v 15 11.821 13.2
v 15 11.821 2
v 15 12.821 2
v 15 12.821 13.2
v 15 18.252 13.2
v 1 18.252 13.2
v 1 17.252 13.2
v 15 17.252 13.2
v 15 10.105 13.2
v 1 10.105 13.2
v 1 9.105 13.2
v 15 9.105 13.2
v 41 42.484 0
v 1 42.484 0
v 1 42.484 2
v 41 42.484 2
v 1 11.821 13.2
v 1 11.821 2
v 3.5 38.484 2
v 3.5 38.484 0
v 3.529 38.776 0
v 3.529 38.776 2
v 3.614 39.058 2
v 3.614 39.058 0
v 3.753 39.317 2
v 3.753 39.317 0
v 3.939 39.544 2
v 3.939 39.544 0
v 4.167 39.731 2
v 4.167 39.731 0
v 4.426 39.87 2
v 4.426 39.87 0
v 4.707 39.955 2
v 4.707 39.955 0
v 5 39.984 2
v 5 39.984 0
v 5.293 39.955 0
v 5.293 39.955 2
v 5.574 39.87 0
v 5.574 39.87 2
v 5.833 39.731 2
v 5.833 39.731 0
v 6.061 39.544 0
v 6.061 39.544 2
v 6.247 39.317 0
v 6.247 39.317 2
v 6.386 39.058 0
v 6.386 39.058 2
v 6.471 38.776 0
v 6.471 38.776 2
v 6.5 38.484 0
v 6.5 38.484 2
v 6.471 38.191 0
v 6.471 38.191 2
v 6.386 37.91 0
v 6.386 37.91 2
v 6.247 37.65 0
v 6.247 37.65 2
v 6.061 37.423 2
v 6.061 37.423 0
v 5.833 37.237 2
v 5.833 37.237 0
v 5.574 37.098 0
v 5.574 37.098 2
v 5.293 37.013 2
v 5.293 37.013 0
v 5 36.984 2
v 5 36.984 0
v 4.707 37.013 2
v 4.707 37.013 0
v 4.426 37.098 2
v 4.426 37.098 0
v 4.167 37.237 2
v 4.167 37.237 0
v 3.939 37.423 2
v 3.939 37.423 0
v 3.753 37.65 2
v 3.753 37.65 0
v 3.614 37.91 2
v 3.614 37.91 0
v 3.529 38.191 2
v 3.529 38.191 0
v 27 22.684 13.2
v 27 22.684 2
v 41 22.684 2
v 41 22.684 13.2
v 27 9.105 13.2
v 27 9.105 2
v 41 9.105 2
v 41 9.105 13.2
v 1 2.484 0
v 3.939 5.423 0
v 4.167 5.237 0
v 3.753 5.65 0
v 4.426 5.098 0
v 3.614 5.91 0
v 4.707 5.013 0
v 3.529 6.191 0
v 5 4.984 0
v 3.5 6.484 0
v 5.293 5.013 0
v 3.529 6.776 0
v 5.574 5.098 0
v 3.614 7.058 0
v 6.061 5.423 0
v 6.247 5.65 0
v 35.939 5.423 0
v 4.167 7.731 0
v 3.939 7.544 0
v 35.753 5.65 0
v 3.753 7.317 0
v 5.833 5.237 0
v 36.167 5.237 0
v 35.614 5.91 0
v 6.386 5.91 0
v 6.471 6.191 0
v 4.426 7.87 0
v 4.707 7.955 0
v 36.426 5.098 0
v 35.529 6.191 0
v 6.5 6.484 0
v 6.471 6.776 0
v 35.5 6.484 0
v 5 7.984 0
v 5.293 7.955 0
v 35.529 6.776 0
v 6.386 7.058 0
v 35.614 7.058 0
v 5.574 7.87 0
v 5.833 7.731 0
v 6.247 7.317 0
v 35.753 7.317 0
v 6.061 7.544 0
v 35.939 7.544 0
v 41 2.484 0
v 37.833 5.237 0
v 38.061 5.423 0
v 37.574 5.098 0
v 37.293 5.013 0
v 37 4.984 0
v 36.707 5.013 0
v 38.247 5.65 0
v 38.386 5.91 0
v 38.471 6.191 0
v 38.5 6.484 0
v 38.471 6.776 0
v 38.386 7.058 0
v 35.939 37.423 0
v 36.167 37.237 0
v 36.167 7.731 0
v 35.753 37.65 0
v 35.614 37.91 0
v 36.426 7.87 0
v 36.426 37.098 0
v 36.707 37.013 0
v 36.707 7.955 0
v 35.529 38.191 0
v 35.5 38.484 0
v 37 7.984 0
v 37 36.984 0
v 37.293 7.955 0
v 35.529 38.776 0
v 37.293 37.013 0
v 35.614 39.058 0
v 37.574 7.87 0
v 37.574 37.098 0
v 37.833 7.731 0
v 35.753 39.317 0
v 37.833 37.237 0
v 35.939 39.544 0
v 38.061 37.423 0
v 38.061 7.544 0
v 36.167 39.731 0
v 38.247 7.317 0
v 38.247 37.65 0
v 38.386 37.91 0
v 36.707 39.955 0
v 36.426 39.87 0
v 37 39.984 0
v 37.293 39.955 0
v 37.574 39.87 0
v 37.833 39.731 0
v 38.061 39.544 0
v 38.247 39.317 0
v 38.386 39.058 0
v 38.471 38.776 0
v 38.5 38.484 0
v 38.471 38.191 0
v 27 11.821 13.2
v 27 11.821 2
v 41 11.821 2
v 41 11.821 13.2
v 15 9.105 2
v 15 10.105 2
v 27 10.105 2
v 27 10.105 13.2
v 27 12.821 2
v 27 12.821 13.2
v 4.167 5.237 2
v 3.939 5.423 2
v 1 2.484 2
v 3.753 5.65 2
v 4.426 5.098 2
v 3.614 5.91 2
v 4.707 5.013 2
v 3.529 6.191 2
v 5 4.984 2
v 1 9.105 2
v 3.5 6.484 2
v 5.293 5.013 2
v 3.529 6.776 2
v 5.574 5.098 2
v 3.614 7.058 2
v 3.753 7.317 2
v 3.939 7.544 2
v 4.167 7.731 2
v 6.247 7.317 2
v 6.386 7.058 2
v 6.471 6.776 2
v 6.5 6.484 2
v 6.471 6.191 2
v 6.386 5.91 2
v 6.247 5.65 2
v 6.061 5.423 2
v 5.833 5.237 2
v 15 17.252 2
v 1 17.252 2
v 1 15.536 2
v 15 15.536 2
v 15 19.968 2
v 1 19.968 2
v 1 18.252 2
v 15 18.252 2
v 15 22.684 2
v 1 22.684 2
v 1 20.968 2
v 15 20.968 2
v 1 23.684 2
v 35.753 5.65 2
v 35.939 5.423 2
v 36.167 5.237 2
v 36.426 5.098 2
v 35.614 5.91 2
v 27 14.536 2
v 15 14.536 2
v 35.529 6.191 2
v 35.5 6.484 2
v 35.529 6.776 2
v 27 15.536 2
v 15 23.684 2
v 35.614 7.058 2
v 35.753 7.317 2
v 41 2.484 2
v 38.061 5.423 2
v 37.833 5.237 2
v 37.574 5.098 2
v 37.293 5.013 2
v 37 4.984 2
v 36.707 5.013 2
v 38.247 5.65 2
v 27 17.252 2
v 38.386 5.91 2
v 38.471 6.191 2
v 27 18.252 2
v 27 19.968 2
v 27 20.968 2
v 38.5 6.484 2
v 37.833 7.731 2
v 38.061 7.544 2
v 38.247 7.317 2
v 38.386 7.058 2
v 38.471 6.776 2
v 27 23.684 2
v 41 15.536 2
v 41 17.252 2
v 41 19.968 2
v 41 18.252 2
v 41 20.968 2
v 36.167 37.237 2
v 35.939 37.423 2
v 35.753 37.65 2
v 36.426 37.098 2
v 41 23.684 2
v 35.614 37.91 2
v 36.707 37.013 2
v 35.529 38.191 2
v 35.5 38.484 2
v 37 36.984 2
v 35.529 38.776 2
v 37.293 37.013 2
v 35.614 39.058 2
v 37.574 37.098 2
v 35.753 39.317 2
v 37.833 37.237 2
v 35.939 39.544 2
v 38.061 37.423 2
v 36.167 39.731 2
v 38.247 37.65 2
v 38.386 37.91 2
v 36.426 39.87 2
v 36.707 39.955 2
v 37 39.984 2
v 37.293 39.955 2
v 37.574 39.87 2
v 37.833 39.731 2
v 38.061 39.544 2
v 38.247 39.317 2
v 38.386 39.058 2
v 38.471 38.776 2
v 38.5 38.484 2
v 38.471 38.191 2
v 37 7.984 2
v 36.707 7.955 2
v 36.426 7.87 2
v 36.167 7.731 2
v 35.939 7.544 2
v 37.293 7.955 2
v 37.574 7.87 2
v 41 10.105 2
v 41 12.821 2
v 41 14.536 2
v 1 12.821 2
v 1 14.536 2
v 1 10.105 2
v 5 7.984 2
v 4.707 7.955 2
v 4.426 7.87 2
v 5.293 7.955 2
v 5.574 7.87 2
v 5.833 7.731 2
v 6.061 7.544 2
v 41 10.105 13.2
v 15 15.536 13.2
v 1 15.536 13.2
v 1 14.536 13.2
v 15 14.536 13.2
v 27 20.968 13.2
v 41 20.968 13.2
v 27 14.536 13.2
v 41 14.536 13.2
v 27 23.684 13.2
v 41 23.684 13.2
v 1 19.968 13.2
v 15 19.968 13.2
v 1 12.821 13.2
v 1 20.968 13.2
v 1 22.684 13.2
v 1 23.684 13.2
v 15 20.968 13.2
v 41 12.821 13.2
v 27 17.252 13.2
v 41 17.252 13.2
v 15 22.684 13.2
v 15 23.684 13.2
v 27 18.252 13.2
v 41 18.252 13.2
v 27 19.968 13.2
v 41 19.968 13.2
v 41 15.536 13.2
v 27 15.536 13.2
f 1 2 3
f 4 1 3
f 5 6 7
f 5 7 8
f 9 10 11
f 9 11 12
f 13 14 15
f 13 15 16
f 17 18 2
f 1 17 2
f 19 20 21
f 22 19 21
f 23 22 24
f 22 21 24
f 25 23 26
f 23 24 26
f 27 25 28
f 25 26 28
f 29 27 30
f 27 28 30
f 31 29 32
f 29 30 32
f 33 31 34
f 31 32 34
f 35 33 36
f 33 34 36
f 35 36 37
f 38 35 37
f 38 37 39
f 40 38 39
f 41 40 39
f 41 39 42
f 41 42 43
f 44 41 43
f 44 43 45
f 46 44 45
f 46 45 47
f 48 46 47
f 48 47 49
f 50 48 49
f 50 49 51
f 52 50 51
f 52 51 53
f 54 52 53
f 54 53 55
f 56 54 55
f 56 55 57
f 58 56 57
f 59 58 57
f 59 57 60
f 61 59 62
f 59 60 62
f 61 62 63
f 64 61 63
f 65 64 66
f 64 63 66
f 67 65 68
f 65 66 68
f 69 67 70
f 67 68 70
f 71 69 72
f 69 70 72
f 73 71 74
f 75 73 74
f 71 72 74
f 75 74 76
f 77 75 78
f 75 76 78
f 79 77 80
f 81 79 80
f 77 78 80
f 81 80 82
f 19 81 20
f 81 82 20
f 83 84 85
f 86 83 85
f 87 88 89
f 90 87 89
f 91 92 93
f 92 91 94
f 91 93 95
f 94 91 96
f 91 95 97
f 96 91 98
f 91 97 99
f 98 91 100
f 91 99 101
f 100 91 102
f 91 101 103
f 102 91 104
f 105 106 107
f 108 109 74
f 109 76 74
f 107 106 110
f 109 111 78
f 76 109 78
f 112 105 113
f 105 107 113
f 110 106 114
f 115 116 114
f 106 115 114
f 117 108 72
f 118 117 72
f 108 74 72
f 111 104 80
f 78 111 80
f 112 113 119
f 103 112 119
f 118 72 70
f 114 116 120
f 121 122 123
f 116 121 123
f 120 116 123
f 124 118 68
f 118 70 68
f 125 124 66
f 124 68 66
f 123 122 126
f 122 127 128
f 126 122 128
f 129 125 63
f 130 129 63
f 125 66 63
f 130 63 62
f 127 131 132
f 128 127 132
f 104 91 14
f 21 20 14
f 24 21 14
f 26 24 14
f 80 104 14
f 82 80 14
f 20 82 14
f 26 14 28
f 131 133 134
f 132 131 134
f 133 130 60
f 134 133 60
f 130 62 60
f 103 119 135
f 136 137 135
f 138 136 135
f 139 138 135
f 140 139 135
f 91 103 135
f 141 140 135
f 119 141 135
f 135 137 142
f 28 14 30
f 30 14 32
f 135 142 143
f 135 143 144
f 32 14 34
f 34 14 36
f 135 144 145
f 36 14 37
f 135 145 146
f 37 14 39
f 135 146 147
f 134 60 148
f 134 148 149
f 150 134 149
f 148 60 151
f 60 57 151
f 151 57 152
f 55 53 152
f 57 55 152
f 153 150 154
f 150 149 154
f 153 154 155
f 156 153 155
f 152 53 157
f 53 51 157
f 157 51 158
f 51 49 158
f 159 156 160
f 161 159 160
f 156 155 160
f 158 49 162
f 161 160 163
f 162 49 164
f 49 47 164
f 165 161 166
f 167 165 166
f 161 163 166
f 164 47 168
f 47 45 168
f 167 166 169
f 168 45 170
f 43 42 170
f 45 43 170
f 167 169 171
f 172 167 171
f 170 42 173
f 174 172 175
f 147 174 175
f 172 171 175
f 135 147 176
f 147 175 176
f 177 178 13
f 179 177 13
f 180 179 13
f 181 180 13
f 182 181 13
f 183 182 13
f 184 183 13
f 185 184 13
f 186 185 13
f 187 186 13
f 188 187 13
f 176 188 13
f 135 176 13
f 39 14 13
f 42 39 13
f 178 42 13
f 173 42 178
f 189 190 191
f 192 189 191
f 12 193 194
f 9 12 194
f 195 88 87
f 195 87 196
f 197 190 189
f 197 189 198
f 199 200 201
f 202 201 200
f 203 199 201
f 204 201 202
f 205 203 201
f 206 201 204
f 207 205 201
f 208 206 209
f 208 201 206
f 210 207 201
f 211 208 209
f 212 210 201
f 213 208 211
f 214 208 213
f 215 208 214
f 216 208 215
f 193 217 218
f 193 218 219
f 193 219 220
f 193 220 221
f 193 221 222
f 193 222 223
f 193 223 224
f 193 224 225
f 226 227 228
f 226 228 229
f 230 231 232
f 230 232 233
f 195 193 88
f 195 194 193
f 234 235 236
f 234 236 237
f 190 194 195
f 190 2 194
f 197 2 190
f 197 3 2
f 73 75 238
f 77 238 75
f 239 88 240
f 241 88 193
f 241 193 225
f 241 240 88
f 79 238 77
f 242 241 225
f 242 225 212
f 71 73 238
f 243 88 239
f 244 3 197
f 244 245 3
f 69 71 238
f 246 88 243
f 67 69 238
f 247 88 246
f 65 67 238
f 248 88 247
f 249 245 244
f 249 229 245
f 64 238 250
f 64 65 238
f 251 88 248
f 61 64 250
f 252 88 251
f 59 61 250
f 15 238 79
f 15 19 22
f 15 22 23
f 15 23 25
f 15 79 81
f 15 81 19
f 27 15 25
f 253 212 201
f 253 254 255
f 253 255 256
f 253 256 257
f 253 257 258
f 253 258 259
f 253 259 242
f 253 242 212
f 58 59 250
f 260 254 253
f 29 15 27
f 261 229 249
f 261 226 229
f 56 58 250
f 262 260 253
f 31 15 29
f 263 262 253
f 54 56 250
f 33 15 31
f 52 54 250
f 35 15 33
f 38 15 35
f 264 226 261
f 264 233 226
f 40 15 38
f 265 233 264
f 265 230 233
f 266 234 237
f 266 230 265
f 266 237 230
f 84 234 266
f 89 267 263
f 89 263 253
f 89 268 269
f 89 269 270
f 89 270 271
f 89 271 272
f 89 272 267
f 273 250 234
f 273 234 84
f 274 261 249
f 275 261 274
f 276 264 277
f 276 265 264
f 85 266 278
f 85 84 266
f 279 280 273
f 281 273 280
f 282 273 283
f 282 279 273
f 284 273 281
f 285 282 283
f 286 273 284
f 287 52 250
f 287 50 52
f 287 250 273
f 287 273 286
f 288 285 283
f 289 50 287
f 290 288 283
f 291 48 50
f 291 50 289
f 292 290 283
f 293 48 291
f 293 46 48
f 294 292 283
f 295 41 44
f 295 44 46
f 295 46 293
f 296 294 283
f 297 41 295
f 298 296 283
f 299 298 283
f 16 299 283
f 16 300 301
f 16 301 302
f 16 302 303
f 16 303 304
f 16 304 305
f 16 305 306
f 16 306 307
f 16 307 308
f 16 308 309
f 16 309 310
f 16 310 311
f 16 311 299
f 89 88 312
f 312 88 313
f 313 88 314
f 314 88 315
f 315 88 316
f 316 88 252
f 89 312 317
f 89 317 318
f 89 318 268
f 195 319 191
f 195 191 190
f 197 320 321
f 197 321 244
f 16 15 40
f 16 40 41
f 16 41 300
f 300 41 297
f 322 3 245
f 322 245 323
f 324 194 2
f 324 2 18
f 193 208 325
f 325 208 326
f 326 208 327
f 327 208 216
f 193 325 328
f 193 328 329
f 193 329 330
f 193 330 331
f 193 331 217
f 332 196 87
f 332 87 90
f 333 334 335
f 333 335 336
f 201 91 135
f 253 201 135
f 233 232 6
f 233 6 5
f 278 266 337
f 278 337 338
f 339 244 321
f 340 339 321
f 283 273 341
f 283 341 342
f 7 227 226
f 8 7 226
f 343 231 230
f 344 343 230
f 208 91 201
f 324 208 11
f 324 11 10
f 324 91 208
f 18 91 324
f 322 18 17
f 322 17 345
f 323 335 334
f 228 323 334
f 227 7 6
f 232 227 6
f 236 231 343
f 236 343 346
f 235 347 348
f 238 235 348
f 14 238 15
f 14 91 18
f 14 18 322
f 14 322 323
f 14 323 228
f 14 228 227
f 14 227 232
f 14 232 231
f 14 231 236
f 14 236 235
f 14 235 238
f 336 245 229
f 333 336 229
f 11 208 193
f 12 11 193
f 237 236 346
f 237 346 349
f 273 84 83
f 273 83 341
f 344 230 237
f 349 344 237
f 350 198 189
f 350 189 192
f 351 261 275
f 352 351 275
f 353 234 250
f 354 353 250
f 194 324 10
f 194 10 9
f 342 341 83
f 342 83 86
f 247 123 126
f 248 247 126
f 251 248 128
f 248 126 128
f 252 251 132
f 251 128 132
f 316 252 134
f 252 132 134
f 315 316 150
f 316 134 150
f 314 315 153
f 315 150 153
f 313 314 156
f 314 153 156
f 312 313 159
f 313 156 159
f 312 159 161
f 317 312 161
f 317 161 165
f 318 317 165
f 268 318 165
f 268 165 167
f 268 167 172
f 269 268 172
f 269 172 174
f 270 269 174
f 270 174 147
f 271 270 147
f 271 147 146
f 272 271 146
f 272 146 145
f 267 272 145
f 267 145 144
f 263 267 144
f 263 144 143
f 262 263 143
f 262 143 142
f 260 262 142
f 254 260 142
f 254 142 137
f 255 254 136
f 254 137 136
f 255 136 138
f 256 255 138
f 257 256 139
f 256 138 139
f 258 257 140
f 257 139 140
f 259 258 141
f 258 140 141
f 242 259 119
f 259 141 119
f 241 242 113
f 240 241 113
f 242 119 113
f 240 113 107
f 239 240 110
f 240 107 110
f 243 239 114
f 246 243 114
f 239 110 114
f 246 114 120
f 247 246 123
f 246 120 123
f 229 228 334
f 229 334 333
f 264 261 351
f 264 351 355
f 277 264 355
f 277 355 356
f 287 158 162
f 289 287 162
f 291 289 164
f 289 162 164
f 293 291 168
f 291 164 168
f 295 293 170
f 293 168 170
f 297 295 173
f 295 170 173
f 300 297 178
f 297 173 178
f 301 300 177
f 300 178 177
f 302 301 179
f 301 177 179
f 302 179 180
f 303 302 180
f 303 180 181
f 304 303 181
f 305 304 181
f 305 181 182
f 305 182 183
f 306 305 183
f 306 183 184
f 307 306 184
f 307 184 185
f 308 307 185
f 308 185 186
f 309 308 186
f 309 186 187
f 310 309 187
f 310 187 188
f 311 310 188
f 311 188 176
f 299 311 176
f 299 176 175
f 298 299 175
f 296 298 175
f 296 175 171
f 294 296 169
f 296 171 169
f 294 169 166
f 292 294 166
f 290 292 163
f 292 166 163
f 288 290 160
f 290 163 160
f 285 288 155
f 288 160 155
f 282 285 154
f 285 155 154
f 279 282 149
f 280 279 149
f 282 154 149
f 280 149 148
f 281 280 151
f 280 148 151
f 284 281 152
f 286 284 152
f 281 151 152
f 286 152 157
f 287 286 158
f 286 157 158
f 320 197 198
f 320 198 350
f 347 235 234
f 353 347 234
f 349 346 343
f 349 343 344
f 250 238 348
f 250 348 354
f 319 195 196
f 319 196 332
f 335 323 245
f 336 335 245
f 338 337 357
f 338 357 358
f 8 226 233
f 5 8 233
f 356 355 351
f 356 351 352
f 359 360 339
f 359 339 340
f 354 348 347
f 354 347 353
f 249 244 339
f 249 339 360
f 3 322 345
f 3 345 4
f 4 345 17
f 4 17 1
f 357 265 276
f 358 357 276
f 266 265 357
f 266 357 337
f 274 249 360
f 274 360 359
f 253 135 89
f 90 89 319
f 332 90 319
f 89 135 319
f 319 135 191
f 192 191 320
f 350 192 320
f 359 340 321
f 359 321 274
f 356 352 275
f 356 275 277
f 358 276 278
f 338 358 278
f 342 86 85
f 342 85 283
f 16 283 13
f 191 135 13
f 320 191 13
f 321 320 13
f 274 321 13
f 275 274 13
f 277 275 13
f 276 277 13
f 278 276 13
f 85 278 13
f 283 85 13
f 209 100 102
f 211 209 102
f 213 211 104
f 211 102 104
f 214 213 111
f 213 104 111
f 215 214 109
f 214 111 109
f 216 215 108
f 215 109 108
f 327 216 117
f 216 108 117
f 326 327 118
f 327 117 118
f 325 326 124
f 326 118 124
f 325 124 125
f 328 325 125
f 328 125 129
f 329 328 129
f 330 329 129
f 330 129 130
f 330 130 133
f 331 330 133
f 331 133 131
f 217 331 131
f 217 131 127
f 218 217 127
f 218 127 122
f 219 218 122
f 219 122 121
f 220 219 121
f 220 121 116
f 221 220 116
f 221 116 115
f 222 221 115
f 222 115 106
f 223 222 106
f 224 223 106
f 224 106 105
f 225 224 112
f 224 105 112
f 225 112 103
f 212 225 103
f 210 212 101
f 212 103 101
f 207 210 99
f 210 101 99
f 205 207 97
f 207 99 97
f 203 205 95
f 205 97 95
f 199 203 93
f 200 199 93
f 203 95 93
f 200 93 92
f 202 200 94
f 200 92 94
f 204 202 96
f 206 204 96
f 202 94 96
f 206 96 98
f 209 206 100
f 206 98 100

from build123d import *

# Parameters (mm, degrees)
SKETCH1_W            = 40
SKETCH1_H            = 40
BOSS_EXTRUDE1_DEPTH  = 2
EXTRUDE_THIN1_START  = 2
SKETCH1_3_W          = 14
SKETCH1_3_H          = 1
EXTRUDE_THIN1_DEPTH  = 11.2
SKETCH3_R            = 1.5
CUT_EXTRUDE1_DEPTH   = 13.2
LPATTERN1_COUNT      = 2
LPATTERN1_PITCH      = 32
LPATTERN1_COUNT_DIR2 = 2
LPATTERN1_PITCH_DIR2 = 32


with BuildPart() as part:
    # Sketch1 → Boss-Extrude1 (new body)
    with BuildSketch(Plane.XY):
        with Locations((21, 22.483732861)):
            Rectangle(SKETCH1_W, SKETCH1_H)
    extrude(amount=BOSS_EXTRUDE1_DEPTH)

    # Sketch1<3> → Extrude-Thin1 (add)
    with BuildSketch(Plane.XY.offset(EXTRUDE_THIN1_START)):
        with Locations((34, 9.604785493)):
            Rectangle(SKETCH1_3_W, SKETCH1_3_H)
        with Locations((34, 12.320574966)):
            Rectangle(SKETCH1_3_W, SKETCH1_3_H)
        with Locations((34, 15.03636444)):
            Rectangle(SKETCH1_3_W, SKETCH1_3_H)
        with Locations((34, 17.752153914)):
            Rectangle(SKETCH1_3_W, SKETCH1_3_H)
        with Locations((34, 20.467943387)):
            Rectangle(SKETCH1_3_W, SKETCH1_3_H)
        with Locations((34, 23.183732861)):
            Rectangle(SKETCH1_3_W, SKETCH1_3_H)
        with Locations((8, 9.604785493)):
            Rectangle(SKETCH1_3_W, SKETCH1_3_H)
        with Locations((8, 12.320574966)):
            Rectangle(SKETCH1_3_W, SKETCH1_3_H)
        with Locations((8, 15.03636444)):
            Rectangle(SKETCH1_3_W, SKETCH1_3_H)
        with Locations((8, 17.752153914)):
            Rectangle(SKETCH1_3_W, SKETCH1_3_H)
        with Locations((8, 20.467943387)):
            Rectangle(SKETCH1_3_W, SKETCH1_3_H)
        with Locations((8, 23.183732861)):
            Rectangle(SKETCH1_3_W, SKETCH1_3_H)
    extrude(amount=EXTRUDE_THIN1_DEPTH)

    # Sketch3 → Cut-Extrude1 (cut)
    with BuildSketch(Plane(origin=(0, 0, 0), x_dir=(-1, 0, 0), z_dir=(0, 0, -1))):
        with Locations((-37, 6.483732861)):
            Circle(SKETCH3_R)
    cut_extrude1 = extrude(amount=-CUT_EXTRUDE1_DEPTH, mode=Mode.SUBTRACT)

    # LPattern1: Cut-Extrude1 2 × 2
    with Locations(*[(-i * LPATTERN1_PITCH, j * LPATTERN1_PITCH_DIR2, 0) for i in range(LPATTERN1_COUNT) for j in range(LPATTERN1_COUNT_DIR2) if (i, j) != (0, 0)]):
        add(cut_extrude1, mode=Mode.SUBTRACT)


solid = part.part
